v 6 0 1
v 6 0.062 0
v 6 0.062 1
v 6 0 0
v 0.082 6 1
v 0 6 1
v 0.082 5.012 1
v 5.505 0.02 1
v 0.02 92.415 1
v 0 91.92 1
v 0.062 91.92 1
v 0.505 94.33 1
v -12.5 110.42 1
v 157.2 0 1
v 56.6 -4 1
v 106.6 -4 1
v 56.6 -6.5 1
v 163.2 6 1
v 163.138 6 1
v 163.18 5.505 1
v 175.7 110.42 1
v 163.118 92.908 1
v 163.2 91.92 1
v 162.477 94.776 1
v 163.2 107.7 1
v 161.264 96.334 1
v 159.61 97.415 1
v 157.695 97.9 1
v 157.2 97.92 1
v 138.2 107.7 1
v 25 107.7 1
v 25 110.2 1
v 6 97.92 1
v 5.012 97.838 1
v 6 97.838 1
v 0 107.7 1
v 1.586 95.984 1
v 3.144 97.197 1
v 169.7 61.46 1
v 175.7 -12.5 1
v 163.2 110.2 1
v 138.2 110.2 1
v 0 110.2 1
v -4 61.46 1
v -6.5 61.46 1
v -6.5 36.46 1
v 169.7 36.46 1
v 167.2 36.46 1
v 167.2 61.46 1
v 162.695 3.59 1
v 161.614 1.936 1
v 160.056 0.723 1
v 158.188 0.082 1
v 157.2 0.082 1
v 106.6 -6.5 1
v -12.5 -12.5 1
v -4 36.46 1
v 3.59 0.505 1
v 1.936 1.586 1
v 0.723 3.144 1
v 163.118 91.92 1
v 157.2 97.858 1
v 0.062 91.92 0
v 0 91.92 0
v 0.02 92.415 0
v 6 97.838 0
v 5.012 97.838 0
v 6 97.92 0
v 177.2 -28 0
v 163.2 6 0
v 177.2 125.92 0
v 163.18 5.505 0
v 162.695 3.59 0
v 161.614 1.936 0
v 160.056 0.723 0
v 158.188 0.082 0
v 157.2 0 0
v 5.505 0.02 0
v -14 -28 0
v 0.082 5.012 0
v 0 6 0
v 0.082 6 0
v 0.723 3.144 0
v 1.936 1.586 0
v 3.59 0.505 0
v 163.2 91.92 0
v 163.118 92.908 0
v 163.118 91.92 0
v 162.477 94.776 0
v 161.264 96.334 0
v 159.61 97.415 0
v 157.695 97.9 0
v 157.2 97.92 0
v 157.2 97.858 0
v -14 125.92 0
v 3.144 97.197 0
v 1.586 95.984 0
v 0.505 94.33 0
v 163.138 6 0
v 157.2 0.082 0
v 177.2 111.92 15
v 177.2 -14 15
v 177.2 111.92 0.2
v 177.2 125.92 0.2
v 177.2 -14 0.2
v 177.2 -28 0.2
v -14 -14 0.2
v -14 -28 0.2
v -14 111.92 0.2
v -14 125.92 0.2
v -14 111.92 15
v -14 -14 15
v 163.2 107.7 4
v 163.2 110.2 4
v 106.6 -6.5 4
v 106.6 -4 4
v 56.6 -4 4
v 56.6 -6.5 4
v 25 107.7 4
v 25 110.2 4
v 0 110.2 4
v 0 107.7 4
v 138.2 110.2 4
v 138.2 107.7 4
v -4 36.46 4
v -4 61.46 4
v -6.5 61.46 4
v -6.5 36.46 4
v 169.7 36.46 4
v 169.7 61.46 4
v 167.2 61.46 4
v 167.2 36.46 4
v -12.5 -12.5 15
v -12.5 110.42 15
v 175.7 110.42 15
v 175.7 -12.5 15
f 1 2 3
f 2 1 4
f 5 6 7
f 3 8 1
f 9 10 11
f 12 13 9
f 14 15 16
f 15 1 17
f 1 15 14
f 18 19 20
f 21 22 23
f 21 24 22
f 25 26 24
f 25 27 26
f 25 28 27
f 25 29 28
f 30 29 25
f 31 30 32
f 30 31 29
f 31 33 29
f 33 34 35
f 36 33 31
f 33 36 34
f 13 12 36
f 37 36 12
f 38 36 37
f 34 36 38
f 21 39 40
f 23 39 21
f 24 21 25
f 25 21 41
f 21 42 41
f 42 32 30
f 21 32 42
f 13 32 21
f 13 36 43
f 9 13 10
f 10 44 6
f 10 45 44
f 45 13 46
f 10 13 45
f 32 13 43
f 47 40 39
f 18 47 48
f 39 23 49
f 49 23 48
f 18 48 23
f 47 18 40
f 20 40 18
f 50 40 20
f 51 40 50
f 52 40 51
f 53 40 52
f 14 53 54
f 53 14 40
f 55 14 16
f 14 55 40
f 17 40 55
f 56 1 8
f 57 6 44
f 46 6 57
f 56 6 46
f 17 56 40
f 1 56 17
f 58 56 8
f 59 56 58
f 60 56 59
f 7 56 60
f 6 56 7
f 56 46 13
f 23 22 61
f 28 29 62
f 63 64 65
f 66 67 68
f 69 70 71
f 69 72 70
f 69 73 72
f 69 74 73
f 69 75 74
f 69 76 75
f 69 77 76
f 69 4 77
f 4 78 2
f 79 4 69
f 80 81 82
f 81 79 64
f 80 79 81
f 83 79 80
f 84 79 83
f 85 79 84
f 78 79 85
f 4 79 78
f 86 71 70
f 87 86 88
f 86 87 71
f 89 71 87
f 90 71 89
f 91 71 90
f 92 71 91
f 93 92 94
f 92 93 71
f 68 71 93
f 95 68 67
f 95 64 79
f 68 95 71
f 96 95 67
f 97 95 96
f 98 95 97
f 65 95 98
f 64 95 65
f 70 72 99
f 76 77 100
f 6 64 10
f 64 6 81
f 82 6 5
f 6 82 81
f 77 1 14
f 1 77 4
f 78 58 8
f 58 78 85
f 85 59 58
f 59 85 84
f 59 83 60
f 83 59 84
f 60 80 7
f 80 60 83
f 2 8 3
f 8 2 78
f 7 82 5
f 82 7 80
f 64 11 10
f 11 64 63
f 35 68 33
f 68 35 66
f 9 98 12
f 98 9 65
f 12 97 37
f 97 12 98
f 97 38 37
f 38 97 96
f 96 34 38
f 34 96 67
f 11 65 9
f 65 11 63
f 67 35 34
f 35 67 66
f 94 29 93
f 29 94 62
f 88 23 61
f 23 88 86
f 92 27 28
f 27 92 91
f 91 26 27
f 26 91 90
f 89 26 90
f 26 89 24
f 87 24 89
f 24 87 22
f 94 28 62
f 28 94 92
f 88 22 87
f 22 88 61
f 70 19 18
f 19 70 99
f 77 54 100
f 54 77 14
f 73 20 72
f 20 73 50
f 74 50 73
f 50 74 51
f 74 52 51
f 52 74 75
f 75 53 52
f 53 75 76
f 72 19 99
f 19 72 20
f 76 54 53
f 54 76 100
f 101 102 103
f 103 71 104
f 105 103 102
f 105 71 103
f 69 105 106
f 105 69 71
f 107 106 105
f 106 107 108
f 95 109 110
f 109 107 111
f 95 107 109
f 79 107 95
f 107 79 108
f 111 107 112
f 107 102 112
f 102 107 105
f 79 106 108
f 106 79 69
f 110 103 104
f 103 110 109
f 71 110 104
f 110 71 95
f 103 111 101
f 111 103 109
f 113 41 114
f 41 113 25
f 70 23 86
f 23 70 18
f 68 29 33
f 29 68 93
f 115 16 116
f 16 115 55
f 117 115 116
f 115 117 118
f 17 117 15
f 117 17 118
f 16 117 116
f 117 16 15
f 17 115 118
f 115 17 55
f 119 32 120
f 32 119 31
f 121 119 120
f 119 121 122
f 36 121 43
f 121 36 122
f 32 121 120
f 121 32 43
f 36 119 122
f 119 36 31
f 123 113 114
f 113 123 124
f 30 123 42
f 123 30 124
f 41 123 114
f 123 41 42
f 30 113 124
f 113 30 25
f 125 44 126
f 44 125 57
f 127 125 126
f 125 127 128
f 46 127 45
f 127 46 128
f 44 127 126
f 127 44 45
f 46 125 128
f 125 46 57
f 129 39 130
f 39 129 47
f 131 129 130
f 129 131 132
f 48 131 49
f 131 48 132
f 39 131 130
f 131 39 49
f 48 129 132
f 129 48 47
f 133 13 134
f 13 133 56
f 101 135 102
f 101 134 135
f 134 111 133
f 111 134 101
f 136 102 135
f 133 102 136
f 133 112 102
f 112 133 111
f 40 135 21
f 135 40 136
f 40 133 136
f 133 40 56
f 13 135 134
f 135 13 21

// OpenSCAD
outline_x=170.2;
outline_y=111.2;
size_x = 163.2;
size_y = 97.92;
cadre_arrondis_r = 6;
cadre_bordure = 14;
cadre_z = 1;
ecran_bordure = (outline_x-size_x)/2+0.5;
ecran_bordure_grande = outline_y-size_y-ecran_bordure+0.5;
boite_z = 14;
cote = 1.5;

module biseau_angle_droit(origine,taille,rotz){
    translate(origine) rotate([0,0,rotz]) difference(){
    cube([taille,taille,cadre_z]);
    translate([taille,taille,-1]) cylinder(r=taille, h=cadre_z+2);
  }  

}

biseau_angle_droit([0,0,0],cadre_arrondis_r,0);
biseau_angle_droit([0,size_y,0],cadre_arrondis_r,-90);
biseau_angle_droit([size_x,size_y,0],cadre_arrondis_r,180);
biseau_angle_droit([size_x,0,0],cadre_arrondis_r,90);

translate([-cadre_bordure,-cadre_bordure*2,0]) cube([size_x+cadre_bordure*2,cadre_bordure,0.2]);
translate([-cadre_bordure,size_y+cadre_bordure,0]) cube([size_x+cadre_bordure*2,cadre_bordure,0.2]);

translate([0,-cadre_bordure,0]) cube([size_x,cadre_bordure,cadre_z]);
translate([0,size_y,0]) cube([size_x,cadre_bordure,cadre_z]);
translate([-cadre_bordure,-cadre_bordure,0]) cube([cadre_bordure,size_y+2*cadre_bordure,cadre_z]);
translate([size_x,-cadre_bordure,0]) cube([cadre_bordure,size_y+2*cadre_bordure,cadre_z]);

translate([size_x/2-25,-2.5-ecran_bordure,cadre_z]) cube([50,2.5,3]);
translate([0,size_y+ecran_bordure_grande,cadre_z]) cube([25,2.5,3]);
translate([size_x-25,size_y+ecran_bordure_grande,cadre_z]) cube([25,2.5,3]);
translate([-2.5-ecran_bordure,size_y/2-25/2,cadre_z]) cube([2.5,25,3]);
translate([size_x+ecran_bordure,size_y/2-25/2,cadre_z]) cube([2.5,25,3]);

//translate([0,0,0]) cube([0,0,0]);
translate([-cadre_bordure,-cadre_bordure,cadre_z]) cube([cote,size_y+2*cadre_bordure,boite_z]);
translate([cadre_bordure+size_x-cote,-cadre_bordure,cadre_z]) cube([cote,size_y+2*cadre_bordure,boite_z]);
translate([-cadre_bordure,-cadre_bordure,cadre_z]) cube([size_x+2*cadre_bordure,cote,boite_z]);
translate([-cadre_bordure,size_y-cote+cadre_bordure,cadre_z]) cube([size_x+2*cadre_bordure,cote,boite_z]);
